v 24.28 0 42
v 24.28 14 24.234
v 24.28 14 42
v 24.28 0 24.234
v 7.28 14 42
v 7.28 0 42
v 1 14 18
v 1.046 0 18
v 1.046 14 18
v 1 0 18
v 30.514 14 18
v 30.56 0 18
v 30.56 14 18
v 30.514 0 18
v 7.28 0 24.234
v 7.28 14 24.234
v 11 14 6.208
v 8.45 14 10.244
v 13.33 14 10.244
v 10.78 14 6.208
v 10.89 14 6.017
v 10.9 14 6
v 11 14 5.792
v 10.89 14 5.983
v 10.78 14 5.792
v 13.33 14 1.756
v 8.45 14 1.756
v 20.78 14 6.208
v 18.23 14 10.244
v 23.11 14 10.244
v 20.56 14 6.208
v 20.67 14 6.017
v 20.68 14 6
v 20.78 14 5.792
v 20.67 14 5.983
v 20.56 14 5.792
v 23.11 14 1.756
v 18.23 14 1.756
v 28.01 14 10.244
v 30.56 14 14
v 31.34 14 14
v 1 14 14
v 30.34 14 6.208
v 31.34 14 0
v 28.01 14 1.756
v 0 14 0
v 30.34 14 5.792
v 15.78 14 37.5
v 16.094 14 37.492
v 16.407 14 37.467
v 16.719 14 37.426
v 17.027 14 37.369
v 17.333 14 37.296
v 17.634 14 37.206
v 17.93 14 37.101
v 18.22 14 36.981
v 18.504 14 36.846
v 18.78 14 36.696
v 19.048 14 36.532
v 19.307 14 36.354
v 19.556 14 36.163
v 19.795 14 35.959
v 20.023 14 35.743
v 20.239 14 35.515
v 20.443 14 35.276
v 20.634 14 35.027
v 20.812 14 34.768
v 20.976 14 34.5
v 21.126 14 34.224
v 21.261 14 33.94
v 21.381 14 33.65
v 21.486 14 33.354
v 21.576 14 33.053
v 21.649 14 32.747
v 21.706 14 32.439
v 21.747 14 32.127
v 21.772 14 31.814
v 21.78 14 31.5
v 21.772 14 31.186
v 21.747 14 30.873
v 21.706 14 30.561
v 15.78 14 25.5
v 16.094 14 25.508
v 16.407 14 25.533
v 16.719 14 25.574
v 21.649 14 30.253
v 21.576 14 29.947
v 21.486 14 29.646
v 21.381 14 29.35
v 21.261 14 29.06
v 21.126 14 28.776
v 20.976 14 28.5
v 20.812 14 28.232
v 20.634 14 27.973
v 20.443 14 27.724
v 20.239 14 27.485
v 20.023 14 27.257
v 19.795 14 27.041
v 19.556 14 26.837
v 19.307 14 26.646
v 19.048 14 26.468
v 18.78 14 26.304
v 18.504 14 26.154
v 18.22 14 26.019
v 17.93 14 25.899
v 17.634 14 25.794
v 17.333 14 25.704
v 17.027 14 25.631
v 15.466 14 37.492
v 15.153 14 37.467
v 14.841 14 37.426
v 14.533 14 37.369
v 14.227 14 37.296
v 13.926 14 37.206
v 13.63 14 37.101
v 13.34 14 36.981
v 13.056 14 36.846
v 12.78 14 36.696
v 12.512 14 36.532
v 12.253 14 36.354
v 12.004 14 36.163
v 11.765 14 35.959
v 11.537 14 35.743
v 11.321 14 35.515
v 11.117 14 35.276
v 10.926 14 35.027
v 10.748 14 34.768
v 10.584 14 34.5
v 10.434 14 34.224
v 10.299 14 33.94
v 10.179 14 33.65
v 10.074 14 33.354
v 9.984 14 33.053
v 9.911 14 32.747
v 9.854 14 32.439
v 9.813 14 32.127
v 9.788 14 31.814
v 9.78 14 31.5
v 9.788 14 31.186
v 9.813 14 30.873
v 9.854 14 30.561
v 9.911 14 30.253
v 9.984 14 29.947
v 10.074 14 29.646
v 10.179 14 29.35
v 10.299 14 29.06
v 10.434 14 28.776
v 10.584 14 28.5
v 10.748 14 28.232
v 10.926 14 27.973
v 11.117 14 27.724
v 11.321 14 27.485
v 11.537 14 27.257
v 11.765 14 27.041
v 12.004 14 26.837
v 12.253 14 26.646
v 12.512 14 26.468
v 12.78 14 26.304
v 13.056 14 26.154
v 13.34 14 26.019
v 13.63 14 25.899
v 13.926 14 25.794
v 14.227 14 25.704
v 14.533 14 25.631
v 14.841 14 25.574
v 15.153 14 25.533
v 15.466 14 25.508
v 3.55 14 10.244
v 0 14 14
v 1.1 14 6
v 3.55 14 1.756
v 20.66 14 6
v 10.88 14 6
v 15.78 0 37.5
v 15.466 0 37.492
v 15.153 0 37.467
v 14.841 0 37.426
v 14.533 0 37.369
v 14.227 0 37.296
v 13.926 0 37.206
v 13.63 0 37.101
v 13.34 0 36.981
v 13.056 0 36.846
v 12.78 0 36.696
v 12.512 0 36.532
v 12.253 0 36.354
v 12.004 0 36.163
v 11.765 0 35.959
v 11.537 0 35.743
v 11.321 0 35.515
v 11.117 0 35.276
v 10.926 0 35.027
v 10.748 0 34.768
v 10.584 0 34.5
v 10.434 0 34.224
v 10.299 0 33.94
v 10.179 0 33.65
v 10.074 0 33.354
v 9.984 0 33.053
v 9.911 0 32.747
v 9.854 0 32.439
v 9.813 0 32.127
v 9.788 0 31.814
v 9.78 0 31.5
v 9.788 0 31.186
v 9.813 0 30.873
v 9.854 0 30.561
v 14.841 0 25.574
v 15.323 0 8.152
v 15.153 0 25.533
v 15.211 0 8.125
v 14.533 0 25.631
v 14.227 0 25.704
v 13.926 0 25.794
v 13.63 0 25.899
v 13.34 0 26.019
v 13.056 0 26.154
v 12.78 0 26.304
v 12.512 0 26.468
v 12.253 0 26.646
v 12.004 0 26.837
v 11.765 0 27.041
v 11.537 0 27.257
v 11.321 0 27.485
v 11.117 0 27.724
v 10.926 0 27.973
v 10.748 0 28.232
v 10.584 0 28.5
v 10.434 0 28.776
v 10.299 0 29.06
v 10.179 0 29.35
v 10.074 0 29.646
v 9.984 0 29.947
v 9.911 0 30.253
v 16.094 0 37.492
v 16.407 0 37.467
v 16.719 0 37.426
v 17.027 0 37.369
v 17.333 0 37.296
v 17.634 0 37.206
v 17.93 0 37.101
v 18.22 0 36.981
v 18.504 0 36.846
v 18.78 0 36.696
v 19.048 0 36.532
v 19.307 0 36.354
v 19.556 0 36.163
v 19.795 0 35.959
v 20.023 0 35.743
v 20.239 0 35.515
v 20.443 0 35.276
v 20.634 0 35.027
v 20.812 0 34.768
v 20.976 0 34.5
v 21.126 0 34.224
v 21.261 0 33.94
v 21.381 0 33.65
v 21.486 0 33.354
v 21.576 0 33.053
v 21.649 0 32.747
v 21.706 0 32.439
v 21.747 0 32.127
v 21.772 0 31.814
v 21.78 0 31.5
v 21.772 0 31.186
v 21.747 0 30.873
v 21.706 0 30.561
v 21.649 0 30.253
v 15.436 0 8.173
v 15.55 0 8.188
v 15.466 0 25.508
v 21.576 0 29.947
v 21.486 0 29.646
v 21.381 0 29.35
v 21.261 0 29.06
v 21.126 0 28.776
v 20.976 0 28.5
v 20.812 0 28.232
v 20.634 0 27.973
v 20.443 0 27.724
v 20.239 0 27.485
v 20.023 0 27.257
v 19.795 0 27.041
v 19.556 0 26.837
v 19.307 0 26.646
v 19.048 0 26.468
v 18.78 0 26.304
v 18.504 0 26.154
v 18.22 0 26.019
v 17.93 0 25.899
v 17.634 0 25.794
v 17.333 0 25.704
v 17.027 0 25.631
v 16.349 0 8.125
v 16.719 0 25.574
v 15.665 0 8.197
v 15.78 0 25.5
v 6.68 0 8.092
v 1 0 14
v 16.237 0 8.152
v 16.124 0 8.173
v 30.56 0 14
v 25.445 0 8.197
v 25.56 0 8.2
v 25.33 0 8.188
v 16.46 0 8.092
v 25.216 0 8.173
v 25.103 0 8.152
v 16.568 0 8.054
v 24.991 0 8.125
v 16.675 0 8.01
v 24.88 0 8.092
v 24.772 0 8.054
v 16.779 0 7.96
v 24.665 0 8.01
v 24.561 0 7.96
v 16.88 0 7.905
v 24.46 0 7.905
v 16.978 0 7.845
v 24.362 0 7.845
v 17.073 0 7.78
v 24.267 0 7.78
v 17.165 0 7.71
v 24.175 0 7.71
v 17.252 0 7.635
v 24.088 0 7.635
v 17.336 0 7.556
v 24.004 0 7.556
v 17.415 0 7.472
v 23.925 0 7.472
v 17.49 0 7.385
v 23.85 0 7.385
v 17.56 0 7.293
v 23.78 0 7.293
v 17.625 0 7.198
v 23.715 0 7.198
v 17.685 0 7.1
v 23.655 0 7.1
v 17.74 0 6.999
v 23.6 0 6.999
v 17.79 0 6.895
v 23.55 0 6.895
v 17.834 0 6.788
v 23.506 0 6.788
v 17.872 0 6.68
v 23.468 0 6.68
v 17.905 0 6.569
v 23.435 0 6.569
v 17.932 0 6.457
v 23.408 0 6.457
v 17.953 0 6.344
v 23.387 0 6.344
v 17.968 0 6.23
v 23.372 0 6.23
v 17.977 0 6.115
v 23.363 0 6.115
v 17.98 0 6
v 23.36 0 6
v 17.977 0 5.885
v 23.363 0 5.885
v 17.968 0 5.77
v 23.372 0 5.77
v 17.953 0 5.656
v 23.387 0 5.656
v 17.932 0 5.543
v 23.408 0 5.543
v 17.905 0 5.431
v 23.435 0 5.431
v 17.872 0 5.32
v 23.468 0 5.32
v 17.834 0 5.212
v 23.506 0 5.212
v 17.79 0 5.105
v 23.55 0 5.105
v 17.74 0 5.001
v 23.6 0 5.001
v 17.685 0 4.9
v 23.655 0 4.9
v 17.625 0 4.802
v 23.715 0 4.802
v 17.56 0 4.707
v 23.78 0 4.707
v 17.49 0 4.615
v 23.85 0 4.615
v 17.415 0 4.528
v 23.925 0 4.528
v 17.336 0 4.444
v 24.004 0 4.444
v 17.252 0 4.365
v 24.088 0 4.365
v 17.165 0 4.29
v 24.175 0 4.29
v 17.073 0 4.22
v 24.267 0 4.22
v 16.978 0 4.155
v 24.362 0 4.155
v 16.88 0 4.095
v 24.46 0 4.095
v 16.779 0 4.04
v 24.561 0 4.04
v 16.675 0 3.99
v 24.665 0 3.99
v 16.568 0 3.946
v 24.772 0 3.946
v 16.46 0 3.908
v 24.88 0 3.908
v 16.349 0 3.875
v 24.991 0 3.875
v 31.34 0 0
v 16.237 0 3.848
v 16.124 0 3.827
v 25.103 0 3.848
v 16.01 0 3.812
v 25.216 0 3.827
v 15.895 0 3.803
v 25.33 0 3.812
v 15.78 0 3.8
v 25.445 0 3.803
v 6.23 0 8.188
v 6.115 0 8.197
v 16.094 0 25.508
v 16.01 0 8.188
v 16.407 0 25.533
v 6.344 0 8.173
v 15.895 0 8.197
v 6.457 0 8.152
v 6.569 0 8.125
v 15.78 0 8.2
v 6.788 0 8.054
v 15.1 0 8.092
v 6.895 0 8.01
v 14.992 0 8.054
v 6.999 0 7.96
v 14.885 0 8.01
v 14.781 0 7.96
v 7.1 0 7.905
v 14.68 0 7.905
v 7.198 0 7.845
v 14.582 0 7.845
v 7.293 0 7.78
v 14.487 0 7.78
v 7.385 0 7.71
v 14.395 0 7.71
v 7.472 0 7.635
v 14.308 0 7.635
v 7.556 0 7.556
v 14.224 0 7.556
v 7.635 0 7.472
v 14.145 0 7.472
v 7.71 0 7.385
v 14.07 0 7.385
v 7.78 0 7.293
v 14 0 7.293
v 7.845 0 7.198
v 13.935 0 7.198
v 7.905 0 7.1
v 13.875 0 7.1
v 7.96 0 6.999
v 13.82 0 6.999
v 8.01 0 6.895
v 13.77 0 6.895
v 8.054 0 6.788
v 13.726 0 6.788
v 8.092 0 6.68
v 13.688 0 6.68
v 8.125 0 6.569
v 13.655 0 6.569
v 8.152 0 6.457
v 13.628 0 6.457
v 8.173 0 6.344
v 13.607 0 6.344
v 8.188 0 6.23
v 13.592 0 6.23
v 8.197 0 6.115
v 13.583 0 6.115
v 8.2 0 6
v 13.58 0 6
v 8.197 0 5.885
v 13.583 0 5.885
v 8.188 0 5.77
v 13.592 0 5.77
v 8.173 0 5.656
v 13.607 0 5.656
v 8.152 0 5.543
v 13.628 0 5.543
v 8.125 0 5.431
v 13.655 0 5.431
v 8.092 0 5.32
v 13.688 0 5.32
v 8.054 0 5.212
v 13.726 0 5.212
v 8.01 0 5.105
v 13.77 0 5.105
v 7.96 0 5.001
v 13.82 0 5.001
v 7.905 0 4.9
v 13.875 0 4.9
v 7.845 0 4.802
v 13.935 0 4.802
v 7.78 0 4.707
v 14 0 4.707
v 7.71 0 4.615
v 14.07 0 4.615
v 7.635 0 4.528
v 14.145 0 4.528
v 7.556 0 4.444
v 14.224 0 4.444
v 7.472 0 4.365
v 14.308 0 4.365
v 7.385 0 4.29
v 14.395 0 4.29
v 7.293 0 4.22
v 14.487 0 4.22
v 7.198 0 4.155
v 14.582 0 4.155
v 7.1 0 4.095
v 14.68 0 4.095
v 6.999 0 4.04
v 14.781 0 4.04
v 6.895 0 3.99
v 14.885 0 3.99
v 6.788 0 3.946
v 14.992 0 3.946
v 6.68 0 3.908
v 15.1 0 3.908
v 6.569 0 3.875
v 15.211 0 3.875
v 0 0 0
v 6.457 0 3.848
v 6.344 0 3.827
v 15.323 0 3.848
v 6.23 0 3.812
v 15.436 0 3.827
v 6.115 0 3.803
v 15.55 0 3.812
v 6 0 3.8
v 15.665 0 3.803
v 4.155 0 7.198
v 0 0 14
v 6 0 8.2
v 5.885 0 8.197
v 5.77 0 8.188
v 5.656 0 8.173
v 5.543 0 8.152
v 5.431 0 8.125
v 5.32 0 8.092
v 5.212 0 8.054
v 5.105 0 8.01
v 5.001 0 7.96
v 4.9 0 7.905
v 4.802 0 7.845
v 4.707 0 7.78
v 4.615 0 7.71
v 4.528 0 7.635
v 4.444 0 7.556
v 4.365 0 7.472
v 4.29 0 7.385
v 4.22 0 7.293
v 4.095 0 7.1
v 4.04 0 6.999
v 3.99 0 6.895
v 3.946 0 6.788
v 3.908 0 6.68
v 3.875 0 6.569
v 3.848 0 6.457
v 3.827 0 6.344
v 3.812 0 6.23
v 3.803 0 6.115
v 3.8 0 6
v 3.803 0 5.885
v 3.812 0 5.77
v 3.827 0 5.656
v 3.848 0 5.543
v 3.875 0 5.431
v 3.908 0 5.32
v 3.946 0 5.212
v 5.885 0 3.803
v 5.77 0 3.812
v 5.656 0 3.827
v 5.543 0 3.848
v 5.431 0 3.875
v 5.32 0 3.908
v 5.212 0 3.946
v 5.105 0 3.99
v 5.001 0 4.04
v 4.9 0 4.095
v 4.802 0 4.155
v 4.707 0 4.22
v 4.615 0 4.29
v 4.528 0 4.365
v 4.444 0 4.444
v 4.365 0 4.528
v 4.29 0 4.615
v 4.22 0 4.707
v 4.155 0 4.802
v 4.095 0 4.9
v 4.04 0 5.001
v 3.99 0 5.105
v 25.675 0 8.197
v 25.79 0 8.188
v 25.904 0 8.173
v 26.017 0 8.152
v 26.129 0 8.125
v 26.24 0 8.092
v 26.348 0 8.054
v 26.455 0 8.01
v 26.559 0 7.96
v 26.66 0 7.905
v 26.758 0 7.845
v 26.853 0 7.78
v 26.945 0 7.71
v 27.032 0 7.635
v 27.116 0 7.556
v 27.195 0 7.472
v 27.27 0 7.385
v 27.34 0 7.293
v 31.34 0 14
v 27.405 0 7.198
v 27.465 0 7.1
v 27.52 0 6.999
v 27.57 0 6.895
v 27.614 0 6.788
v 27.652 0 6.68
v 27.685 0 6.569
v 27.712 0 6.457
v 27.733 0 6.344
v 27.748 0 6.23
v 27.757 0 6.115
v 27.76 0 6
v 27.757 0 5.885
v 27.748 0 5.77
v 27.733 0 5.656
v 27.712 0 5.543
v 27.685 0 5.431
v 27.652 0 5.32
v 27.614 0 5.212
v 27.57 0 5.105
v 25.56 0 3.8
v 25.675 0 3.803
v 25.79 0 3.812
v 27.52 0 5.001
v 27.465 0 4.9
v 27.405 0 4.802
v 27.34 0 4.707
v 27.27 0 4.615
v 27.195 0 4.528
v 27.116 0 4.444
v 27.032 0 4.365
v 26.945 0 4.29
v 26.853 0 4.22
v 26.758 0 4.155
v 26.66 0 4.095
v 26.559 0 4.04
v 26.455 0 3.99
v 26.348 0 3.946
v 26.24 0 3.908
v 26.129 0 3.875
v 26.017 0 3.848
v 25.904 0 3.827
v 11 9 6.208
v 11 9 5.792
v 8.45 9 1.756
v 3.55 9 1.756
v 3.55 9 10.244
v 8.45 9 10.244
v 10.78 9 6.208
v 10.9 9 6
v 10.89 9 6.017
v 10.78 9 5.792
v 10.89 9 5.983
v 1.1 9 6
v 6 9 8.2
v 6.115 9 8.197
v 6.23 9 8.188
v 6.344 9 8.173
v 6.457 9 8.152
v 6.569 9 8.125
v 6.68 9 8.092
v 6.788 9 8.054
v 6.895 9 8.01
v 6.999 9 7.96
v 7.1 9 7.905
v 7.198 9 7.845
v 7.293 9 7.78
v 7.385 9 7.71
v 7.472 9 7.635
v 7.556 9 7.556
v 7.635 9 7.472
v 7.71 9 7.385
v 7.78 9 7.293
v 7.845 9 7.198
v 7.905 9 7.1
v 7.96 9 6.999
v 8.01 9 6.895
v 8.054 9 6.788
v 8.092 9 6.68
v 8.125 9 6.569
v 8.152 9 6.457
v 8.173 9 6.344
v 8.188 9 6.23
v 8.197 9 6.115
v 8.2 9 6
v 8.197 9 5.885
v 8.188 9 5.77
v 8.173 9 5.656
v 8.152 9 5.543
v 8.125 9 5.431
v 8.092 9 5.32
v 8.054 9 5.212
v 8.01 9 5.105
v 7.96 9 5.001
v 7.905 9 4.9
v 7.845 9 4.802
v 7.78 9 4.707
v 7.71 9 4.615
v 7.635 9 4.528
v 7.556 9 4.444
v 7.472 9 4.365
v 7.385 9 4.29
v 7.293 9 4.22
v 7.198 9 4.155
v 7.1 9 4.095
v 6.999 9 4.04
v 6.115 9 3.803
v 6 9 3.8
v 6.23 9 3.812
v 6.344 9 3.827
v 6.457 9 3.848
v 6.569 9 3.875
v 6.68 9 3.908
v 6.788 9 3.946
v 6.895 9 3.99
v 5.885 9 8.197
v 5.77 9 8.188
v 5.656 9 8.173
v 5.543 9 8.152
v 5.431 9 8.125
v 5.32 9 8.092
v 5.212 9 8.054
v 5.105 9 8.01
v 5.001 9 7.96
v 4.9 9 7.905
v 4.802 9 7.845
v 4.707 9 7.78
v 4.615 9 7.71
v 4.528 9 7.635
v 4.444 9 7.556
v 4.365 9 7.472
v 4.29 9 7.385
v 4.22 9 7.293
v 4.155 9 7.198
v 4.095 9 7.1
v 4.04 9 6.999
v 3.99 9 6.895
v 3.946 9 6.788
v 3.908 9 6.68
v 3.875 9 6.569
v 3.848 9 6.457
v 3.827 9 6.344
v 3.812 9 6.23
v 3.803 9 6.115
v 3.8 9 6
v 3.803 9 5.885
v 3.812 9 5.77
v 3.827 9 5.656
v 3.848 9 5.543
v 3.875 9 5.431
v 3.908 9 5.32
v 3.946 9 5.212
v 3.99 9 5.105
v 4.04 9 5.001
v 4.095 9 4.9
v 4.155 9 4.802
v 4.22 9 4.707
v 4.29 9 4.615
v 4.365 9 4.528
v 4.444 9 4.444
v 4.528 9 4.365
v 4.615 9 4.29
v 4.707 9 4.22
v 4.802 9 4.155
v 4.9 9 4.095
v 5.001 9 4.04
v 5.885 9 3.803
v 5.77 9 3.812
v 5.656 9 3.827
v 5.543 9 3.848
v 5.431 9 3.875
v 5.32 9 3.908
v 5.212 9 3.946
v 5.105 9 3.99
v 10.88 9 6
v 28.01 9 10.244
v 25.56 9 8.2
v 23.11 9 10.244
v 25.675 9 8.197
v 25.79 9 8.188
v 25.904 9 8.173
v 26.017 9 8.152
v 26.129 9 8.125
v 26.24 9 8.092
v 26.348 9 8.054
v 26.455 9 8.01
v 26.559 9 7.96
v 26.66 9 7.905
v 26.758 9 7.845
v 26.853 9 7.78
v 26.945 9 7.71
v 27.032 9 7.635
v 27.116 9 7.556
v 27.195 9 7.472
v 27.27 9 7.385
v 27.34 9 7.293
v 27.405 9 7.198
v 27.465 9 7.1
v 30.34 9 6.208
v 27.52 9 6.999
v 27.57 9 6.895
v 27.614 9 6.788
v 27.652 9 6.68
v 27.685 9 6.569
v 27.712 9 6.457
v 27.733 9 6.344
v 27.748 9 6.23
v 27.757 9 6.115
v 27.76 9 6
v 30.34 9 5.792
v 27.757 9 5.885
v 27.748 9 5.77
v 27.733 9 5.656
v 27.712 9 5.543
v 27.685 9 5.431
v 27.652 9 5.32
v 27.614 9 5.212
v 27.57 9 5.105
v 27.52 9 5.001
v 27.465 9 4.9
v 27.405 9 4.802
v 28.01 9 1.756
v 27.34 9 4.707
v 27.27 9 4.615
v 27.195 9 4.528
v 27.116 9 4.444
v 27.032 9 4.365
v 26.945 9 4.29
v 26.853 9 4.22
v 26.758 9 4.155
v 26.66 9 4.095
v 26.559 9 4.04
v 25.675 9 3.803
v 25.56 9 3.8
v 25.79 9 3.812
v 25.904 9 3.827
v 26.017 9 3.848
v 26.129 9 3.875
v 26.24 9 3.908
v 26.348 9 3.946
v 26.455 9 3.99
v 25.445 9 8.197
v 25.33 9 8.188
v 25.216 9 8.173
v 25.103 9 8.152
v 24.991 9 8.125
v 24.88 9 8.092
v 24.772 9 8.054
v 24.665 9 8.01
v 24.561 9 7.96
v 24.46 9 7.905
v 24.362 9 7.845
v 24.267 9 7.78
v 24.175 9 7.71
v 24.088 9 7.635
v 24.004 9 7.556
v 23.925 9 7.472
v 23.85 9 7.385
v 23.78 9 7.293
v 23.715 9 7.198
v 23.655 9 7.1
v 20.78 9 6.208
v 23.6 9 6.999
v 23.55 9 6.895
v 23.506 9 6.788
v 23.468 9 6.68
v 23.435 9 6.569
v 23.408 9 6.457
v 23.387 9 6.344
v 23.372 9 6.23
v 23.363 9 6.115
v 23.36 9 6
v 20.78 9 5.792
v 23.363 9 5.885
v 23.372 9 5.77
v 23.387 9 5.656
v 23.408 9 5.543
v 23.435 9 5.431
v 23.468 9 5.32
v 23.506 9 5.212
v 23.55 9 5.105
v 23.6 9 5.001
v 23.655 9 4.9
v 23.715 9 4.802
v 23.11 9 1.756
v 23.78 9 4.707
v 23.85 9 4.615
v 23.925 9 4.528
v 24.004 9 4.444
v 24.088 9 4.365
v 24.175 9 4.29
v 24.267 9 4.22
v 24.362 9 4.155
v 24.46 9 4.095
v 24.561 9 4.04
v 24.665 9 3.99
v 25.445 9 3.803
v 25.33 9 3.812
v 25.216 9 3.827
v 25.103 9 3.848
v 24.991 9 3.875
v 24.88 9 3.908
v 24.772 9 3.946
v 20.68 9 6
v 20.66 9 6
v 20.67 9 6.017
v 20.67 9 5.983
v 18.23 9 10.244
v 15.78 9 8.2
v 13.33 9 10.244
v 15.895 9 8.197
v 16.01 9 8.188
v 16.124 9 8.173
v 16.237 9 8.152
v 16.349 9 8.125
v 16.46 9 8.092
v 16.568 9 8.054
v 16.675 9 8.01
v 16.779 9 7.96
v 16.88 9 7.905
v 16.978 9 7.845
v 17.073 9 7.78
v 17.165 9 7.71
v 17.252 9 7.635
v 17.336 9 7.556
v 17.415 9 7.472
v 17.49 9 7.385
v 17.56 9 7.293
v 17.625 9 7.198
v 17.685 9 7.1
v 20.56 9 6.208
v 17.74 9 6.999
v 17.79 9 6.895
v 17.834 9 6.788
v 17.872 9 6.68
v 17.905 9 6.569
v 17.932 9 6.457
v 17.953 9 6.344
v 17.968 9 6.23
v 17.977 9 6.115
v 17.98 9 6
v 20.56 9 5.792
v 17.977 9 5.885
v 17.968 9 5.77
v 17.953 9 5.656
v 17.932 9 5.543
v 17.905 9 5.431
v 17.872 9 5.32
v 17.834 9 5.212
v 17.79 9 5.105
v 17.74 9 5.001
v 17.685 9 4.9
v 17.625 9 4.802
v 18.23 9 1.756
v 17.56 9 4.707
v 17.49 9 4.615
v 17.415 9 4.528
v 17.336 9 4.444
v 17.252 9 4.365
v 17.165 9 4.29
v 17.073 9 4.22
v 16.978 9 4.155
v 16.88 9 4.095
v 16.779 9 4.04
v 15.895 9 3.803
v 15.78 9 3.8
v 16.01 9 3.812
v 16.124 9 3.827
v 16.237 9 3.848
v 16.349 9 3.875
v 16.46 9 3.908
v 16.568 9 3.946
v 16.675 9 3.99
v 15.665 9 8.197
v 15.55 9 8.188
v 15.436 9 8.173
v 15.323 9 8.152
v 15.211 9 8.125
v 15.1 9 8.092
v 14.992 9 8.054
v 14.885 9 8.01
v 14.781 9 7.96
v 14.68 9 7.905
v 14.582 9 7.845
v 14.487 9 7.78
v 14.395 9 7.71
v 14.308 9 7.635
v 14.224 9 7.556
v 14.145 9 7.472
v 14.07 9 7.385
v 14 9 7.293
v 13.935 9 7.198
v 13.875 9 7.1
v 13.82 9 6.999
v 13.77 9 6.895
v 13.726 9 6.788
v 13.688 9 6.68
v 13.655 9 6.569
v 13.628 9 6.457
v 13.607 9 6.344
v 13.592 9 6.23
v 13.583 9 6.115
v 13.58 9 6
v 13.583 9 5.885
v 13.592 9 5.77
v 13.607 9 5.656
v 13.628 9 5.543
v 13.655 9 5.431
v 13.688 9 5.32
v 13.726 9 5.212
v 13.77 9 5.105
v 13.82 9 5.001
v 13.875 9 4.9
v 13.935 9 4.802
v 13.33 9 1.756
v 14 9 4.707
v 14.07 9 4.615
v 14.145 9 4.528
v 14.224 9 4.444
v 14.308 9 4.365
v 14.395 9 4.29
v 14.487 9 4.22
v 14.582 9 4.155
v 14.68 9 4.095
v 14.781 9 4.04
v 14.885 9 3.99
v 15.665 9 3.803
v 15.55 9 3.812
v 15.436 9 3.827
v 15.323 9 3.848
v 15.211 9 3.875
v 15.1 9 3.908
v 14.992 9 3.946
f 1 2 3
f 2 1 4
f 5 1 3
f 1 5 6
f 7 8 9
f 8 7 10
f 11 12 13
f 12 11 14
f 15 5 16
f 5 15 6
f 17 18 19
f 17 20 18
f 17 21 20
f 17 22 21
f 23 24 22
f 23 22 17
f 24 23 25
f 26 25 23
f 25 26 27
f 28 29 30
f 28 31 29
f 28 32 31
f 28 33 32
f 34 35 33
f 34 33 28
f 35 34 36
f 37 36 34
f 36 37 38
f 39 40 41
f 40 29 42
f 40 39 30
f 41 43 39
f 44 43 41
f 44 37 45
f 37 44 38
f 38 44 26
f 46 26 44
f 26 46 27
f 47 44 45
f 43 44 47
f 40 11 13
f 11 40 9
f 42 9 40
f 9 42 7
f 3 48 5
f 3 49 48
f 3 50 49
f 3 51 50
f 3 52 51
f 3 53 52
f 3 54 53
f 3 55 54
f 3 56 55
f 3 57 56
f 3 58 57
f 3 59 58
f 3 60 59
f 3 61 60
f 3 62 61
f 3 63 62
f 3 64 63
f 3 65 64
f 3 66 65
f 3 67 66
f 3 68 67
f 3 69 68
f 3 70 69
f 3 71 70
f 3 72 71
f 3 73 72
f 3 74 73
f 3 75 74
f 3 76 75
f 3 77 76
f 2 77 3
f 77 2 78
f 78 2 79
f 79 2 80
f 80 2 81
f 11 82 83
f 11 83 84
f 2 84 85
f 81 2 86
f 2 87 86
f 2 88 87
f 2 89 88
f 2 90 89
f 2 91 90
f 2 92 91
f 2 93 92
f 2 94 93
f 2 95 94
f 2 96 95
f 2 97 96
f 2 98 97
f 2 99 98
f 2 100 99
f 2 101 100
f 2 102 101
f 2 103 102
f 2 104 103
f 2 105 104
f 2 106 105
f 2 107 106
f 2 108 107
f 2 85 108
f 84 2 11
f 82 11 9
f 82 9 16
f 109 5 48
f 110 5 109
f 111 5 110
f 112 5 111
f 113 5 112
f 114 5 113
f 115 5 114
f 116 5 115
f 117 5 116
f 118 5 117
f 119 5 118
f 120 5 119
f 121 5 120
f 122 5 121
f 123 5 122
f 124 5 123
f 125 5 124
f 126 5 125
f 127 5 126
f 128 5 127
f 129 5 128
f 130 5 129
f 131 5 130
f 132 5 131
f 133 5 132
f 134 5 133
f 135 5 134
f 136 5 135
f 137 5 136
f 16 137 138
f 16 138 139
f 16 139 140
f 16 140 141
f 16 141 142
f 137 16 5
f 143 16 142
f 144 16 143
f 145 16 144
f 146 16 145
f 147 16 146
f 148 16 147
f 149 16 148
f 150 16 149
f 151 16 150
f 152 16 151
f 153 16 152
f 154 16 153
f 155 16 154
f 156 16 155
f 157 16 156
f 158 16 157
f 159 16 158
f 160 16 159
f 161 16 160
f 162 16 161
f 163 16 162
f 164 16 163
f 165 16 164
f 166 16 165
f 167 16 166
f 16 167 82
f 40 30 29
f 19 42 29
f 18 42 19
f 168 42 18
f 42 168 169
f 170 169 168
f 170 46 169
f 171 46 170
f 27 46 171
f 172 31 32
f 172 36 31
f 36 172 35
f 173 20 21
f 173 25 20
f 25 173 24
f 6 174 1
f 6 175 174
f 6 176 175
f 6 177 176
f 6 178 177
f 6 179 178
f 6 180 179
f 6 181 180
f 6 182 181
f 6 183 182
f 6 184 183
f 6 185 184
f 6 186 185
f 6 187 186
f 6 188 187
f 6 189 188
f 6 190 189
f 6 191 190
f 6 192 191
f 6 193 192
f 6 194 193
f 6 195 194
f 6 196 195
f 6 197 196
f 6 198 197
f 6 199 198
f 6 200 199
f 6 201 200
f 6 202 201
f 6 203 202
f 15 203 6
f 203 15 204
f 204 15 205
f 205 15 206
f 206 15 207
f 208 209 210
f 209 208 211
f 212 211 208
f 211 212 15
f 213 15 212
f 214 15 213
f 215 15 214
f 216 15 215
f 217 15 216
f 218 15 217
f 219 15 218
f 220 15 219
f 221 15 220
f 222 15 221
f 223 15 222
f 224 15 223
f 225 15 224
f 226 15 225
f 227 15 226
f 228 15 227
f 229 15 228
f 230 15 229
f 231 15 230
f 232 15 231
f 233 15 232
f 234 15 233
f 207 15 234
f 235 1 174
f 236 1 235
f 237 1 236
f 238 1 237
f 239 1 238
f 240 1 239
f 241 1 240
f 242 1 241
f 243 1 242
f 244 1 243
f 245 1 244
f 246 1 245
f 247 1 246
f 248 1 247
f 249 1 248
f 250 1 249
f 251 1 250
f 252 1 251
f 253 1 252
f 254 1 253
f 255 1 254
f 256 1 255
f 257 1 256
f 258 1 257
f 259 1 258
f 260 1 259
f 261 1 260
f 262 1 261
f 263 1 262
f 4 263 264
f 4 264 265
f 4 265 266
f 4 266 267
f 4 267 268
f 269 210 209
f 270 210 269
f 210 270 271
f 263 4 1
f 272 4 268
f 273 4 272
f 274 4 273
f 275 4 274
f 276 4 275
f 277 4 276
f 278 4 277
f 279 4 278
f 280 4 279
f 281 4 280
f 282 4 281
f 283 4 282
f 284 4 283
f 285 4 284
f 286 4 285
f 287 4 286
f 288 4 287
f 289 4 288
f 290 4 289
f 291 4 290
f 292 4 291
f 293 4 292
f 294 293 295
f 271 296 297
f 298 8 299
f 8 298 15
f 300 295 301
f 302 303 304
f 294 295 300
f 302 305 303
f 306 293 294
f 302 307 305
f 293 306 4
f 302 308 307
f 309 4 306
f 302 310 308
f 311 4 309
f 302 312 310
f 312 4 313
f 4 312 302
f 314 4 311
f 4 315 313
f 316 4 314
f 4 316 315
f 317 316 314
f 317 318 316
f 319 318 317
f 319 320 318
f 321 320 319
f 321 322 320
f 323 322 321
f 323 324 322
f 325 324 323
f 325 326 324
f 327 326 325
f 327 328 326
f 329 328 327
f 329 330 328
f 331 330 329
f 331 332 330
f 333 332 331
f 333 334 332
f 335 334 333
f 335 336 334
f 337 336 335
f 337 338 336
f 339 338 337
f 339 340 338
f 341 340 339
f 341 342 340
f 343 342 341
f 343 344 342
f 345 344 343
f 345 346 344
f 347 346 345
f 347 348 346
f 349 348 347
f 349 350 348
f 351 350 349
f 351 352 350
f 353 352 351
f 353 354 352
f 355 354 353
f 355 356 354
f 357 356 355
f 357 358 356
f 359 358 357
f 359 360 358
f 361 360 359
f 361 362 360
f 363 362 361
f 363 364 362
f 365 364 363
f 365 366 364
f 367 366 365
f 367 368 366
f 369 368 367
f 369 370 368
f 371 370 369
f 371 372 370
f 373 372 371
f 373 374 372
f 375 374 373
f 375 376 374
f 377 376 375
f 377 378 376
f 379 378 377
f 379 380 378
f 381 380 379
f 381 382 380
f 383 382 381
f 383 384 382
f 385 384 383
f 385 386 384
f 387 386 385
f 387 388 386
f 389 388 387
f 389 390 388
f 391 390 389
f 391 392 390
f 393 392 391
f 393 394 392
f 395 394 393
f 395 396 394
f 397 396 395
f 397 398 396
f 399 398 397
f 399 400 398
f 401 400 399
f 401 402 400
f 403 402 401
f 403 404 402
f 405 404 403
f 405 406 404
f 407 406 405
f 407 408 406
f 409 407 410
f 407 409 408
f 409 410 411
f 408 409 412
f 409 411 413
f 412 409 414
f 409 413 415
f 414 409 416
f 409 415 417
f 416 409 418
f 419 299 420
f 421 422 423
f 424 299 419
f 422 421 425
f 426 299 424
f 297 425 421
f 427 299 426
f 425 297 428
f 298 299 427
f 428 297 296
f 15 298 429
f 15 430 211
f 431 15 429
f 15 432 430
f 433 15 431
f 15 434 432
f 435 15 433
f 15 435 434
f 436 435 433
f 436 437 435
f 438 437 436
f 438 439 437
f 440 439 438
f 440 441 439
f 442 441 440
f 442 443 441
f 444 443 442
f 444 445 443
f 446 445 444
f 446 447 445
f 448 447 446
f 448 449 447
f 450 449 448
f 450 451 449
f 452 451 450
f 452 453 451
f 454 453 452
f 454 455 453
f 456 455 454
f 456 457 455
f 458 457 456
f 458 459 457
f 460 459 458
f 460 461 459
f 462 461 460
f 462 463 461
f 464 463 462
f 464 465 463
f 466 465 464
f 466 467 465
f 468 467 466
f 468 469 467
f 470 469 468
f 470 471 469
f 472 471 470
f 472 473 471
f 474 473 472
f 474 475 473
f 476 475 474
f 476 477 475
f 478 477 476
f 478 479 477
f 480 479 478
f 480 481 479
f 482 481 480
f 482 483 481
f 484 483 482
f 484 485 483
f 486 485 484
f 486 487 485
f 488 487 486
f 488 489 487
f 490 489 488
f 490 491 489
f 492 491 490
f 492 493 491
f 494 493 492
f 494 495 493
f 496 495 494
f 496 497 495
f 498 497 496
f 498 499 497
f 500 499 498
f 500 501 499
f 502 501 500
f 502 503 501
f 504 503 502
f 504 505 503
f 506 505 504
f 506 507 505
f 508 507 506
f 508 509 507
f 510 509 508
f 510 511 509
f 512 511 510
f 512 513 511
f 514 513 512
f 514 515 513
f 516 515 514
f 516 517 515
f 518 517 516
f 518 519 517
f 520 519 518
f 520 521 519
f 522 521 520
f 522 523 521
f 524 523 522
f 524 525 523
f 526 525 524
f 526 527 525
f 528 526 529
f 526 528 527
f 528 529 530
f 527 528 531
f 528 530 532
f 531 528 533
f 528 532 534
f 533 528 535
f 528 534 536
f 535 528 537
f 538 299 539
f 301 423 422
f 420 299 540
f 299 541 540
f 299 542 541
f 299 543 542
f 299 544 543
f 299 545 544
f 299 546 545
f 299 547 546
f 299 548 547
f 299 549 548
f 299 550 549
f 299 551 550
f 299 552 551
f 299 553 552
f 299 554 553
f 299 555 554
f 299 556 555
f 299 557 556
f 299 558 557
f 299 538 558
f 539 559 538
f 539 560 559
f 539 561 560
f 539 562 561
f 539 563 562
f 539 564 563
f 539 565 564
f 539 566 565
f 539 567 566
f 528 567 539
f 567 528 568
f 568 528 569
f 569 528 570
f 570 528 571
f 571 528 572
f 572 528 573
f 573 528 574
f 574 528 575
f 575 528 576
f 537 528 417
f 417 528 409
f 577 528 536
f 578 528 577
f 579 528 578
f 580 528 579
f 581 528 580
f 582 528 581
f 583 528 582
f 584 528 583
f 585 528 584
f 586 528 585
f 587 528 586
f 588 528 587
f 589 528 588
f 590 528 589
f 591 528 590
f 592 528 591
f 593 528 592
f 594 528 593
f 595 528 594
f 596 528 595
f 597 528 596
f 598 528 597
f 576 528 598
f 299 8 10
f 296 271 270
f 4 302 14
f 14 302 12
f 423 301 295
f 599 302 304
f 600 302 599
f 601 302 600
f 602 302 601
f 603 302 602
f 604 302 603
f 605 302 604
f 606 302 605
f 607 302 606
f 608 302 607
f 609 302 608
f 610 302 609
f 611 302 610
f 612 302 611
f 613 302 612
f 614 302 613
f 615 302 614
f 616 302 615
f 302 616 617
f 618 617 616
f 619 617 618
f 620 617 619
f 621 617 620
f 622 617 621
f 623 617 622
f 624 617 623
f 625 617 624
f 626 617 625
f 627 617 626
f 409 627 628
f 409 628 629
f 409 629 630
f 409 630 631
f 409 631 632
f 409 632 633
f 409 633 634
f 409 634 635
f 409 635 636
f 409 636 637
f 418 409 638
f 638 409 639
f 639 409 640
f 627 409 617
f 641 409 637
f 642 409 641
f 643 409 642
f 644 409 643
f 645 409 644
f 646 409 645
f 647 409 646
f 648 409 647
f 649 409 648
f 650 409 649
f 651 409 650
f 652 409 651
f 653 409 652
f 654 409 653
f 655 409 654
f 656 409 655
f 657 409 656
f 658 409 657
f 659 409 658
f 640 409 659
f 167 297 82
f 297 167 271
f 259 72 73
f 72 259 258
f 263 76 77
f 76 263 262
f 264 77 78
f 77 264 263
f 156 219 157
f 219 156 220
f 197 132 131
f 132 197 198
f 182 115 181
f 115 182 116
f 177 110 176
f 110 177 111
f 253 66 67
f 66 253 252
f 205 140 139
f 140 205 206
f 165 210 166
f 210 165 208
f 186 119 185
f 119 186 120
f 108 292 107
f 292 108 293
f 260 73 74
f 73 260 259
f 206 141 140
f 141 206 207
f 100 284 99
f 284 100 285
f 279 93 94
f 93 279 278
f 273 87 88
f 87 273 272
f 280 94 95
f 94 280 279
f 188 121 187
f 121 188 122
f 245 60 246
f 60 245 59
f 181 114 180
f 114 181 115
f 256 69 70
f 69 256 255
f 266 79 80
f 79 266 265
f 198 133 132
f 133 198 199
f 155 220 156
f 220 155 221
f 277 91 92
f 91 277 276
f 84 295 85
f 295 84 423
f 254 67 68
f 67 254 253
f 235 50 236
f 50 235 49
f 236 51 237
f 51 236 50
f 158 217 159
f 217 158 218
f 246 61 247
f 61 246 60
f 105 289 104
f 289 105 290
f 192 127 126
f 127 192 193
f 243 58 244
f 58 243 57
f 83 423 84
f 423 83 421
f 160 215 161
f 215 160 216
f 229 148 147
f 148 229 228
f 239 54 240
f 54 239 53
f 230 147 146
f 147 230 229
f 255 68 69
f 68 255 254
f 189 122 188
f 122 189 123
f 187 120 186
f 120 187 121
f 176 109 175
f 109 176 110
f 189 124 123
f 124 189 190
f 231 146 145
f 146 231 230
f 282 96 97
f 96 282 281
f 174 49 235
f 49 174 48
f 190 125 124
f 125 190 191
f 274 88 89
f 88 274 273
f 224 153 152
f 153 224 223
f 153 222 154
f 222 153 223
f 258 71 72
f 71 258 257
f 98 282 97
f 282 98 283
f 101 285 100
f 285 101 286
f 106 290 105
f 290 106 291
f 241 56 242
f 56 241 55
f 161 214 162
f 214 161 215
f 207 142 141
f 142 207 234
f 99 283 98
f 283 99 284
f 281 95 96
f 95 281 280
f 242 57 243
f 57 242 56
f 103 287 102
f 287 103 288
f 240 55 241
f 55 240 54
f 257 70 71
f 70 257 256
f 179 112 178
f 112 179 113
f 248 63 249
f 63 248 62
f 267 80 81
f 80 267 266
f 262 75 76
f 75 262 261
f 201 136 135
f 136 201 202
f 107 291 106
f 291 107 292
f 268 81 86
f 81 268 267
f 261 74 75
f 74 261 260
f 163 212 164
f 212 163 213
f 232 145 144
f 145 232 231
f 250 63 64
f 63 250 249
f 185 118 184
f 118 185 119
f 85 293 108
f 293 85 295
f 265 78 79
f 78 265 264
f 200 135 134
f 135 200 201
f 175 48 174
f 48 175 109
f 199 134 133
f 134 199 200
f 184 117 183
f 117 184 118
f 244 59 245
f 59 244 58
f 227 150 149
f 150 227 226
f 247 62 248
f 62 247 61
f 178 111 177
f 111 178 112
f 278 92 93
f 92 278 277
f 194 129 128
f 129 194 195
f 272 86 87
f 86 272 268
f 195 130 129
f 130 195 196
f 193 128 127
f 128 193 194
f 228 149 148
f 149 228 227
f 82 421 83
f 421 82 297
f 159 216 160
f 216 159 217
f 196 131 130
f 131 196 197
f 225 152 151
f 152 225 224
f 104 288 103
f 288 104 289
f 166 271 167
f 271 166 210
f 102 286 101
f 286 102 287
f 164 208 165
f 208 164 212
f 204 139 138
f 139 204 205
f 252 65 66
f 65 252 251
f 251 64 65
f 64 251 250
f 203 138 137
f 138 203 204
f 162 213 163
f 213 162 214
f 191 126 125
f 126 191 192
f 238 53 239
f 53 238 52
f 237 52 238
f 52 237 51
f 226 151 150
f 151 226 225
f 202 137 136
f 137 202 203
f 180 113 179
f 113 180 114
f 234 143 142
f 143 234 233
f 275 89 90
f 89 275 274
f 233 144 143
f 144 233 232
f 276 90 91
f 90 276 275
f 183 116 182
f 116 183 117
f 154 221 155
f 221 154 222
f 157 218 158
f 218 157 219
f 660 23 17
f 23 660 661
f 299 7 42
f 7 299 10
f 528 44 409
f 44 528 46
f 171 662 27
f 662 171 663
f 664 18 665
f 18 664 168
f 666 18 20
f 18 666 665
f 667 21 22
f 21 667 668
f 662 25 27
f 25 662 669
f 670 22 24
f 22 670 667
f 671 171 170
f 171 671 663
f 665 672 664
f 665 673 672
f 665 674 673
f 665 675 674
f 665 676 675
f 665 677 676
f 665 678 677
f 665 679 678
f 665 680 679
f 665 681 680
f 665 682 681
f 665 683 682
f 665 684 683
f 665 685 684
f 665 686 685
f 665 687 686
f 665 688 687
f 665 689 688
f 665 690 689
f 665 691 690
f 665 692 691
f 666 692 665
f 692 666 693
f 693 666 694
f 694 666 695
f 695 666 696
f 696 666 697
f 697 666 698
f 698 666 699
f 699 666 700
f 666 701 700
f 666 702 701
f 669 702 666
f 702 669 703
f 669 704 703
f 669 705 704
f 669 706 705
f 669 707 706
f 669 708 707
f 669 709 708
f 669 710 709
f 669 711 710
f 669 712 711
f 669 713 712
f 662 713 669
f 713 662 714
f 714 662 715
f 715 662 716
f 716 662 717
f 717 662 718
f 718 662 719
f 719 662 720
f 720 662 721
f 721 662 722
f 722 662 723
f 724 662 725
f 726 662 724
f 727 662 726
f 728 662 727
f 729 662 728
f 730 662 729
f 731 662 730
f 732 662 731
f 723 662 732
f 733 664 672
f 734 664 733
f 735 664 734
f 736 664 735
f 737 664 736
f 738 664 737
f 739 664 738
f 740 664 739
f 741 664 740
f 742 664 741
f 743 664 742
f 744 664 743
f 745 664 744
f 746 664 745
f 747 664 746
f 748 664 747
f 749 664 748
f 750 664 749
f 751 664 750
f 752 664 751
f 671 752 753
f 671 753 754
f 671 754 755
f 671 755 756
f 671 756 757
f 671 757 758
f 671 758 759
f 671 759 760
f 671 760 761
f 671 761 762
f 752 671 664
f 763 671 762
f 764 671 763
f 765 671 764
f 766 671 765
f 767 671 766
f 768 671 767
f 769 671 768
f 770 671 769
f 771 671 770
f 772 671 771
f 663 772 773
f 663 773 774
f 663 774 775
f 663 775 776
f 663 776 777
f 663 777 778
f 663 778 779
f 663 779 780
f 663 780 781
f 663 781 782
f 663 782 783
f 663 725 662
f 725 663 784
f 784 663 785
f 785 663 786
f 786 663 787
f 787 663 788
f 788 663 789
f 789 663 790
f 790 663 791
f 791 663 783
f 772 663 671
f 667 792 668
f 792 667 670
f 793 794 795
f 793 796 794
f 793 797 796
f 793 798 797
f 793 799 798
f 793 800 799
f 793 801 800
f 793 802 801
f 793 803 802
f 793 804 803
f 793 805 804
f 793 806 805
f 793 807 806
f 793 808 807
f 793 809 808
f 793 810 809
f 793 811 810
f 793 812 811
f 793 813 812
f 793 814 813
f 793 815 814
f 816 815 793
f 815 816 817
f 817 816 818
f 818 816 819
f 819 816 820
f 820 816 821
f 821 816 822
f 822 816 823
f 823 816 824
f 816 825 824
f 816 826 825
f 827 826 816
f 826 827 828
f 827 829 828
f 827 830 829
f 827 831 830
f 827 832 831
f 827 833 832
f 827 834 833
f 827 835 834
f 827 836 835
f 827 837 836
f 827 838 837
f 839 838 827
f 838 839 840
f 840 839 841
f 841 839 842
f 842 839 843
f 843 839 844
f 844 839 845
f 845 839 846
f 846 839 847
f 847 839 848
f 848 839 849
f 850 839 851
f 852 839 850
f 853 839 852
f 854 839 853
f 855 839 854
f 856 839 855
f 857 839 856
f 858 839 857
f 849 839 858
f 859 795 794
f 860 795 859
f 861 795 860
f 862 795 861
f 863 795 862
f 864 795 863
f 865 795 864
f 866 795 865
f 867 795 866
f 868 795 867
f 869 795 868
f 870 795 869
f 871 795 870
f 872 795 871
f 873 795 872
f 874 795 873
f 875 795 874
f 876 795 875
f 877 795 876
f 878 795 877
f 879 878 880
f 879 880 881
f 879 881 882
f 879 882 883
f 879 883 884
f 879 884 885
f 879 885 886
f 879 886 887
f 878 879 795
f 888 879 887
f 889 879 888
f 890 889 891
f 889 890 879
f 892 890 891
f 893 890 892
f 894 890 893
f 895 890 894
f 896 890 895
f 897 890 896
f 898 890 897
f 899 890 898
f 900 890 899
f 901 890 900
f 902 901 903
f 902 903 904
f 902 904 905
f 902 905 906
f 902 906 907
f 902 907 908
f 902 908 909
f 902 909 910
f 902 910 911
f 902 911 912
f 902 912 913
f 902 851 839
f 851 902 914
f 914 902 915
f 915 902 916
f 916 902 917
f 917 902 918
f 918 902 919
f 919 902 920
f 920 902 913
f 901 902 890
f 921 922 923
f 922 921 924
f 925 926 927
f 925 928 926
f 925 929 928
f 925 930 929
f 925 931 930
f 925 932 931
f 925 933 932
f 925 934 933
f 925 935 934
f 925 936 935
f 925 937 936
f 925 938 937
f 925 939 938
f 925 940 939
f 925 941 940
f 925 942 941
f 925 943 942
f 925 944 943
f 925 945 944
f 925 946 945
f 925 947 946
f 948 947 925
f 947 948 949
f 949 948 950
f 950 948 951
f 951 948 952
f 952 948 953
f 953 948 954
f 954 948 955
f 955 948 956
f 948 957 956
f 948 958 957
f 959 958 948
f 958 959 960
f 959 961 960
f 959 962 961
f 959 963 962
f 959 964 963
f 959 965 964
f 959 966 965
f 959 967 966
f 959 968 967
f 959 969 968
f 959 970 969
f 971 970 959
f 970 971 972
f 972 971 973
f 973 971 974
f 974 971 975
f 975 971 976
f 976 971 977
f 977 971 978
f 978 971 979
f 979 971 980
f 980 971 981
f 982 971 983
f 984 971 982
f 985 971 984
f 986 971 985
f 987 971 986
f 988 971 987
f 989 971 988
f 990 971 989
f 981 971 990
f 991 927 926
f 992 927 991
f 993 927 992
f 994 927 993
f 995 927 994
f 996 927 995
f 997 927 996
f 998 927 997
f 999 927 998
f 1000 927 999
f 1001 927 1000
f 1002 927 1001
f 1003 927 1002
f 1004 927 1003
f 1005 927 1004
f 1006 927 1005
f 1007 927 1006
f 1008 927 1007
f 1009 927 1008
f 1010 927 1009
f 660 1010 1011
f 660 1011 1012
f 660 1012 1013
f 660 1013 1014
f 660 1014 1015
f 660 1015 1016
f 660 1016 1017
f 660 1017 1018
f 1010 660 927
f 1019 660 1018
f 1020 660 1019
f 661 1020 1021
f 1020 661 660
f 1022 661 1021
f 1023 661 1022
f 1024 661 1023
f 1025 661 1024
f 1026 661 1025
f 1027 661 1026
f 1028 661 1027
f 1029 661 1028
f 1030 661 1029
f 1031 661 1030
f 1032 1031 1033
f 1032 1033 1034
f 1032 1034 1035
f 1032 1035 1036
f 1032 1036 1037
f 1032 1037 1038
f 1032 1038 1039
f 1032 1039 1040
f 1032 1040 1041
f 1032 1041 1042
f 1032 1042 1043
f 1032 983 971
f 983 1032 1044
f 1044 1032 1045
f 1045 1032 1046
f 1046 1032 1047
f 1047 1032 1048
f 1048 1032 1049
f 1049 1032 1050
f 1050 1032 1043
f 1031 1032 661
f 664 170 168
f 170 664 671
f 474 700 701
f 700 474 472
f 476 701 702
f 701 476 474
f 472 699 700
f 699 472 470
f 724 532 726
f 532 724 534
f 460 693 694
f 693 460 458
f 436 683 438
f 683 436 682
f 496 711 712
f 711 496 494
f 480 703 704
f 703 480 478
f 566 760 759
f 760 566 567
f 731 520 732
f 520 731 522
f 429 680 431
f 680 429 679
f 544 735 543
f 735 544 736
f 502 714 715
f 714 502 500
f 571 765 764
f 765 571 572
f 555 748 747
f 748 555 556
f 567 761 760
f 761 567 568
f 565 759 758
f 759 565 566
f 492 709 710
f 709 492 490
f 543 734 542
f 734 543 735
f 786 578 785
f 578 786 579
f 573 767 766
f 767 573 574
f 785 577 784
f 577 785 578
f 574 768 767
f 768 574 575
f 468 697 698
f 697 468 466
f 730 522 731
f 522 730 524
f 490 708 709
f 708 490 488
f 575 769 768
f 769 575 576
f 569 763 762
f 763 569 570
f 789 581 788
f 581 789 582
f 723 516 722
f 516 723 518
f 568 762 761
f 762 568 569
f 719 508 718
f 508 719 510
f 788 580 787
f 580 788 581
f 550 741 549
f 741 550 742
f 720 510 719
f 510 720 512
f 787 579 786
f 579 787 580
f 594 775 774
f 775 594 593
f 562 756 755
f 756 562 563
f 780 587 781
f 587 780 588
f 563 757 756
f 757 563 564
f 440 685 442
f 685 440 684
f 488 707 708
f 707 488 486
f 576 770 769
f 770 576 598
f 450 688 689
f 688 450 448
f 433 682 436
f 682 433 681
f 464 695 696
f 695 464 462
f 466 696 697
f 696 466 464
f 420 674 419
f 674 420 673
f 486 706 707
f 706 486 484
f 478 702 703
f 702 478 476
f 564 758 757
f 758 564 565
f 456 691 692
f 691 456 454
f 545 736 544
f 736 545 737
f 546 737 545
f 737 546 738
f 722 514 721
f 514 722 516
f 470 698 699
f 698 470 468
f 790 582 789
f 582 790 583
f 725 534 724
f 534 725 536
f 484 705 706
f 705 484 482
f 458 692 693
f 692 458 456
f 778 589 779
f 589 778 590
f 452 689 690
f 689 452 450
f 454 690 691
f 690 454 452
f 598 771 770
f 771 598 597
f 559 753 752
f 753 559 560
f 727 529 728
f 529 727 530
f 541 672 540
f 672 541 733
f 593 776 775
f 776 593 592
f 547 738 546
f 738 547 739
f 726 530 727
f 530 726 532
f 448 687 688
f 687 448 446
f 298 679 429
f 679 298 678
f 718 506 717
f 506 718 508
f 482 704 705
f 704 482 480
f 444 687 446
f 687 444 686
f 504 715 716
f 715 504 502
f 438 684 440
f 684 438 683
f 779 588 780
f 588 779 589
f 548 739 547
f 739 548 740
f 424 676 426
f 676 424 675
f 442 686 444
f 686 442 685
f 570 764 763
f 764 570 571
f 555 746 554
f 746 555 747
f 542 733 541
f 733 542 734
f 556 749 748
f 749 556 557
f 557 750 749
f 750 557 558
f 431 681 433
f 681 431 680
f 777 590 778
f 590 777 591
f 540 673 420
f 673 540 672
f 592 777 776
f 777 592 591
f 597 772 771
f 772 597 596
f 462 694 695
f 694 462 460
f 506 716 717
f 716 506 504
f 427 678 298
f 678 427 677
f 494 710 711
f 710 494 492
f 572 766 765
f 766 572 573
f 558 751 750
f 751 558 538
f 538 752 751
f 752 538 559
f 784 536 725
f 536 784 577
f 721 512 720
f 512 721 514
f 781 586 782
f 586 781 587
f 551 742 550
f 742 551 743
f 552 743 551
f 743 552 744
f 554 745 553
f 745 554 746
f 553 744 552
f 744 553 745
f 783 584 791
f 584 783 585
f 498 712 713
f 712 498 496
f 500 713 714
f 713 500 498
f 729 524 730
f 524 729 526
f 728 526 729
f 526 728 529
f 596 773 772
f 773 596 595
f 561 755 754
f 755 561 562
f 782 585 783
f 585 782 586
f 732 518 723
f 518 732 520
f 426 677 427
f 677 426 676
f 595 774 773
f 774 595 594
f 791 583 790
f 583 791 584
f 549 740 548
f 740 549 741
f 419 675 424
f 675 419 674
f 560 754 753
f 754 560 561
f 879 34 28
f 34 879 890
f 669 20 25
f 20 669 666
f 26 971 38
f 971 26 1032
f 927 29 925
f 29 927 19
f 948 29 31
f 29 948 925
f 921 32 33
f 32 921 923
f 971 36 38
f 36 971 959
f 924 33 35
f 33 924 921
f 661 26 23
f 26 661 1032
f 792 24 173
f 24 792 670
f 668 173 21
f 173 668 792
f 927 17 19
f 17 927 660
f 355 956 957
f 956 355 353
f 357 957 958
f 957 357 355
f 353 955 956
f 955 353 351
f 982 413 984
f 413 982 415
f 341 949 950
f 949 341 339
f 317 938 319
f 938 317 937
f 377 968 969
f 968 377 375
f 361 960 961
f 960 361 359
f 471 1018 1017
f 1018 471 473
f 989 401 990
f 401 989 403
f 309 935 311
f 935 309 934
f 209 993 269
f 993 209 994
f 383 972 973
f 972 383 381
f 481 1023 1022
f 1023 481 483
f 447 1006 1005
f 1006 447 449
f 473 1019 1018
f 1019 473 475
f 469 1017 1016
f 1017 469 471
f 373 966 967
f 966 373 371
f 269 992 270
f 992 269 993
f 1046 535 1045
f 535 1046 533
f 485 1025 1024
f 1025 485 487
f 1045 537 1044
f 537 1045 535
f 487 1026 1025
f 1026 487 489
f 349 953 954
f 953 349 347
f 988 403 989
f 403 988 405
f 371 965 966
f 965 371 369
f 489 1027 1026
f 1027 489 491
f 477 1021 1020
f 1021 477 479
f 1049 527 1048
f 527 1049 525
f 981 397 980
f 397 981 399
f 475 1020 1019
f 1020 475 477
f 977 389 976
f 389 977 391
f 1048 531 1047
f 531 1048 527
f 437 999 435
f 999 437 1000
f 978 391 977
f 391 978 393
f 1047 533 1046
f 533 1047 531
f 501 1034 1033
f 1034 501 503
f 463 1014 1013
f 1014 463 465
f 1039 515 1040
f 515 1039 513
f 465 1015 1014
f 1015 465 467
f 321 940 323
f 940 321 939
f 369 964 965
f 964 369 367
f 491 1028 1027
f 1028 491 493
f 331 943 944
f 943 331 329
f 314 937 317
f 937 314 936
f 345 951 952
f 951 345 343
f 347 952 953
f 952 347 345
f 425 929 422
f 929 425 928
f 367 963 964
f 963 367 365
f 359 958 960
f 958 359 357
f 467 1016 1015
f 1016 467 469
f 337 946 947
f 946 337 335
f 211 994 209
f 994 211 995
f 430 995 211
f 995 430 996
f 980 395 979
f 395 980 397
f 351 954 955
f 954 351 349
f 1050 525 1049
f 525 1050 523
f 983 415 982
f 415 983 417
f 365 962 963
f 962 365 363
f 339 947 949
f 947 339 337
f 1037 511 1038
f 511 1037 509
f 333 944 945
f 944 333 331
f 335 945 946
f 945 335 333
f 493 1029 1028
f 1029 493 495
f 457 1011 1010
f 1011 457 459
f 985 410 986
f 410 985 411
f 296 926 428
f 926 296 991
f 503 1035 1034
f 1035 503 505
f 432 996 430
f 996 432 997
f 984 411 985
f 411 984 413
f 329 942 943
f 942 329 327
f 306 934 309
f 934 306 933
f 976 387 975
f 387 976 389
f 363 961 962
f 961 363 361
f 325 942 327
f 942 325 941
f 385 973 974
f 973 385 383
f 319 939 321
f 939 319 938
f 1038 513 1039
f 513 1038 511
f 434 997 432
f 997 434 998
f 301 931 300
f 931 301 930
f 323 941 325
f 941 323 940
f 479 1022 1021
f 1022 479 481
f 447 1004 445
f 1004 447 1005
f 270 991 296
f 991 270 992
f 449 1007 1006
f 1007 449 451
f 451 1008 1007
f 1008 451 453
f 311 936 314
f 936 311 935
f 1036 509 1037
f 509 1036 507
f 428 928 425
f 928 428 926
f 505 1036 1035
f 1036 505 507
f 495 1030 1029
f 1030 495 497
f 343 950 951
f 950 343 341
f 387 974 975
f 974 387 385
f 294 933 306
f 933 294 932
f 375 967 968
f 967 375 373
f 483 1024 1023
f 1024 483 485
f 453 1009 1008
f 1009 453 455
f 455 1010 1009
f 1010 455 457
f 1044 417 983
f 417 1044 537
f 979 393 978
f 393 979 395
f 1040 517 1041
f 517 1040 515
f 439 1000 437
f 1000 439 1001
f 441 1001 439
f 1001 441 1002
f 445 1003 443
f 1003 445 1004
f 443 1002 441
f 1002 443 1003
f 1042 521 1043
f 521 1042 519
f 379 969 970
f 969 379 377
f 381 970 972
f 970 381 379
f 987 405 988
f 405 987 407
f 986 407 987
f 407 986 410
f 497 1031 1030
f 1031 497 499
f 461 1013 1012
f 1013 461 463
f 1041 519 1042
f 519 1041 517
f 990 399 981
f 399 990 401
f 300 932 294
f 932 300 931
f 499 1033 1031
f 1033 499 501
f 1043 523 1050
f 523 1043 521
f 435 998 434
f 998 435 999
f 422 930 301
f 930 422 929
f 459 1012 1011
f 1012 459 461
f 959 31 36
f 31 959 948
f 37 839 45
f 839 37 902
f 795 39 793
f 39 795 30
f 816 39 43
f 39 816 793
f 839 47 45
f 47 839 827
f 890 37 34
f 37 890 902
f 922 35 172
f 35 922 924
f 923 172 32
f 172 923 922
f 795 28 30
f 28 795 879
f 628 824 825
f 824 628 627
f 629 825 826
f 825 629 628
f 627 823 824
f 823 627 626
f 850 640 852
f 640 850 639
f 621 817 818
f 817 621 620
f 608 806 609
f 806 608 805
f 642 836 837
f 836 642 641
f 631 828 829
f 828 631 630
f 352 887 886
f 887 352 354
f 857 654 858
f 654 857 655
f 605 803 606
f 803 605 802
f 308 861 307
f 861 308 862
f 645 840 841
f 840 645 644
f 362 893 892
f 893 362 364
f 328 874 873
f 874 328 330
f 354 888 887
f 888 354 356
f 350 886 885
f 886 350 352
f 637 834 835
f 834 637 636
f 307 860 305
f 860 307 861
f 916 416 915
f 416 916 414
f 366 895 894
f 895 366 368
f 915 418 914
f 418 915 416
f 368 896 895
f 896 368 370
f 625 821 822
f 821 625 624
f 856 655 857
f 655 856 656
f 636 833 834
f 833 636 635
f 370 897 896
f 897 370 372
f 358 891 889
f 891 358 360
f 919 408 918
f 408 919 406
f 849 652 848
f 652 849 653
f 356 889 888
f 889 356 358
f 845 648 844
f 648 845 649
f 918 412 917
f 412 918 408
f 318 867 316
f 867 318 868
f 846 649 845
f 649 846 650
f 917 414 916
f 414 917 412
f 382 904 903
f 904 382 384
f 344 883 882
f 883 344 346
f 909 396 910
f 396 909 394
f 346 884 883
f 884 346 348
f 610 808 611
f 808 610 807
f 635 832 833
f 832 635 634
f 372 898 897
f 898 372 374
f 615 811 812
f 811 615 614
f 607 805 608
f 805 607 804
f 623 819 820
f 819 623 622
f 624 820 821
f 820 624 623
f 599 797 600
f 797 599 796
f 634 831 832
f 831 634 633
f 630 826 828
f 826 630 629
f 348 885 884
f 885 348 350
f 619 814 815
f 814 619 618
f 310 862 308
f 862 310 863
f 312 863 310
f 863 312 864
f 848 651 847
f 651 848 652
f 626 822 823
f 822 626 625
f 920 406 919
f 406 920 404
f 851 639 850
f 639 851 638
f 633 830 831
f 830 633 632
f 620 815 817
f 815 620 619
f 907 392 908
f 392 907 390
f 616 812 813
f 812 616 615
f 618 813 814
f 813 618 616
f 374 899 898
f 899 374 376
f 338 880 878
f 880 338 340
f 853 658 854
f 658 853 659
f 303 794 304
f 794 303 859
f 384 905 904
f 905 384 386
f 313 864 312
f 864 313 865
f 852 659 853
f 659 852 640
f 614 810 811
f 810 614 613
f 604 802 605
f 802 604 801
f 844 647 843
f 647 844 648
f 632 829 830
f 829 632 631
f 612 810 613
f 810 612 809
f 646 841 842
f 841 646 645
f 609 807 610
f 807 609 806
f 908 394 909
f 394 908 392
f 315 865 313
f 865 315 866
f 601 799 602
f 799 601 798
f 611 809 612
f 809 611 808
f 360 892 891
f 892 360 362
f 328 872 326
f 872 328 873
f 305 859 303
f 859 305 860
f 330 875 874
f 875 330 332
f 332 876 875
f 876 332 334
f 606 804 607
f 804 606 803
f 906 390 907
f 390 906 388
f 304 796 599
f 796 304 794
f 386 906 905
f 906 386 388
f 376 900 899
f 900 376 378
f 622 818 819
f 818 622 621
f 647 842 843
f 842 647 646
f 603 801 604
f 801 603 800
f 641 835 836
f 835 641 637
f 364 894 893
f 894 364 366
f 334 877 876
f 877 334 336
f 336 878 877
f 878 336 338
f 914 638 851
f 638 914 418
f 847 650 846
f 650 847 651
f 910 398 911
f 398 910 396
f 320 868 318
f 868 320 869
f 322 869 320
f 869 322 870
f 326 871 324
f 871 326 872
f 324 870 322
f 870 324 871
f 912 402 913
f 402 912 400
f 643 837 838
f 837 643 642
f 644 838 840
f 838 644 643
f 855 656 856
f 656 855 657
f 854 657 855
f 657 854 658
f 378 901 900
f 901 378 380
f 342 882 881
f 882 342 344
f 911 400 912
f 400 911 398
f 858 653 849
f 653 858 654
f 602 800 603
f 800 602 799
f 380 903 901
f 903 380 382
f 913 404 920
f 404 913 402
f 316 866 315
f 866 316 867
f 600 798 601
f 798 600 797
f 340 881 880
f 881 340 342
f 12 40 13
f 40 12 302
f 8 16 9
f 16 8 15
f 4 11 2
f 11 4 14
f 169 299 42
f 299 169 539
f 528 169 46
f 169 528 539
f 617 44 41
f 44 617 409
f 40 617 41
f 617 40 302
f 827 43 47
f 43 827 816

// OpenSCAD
// Real Lonely T-Rex Game: Bearing Holder
// Copyright (C) 2017, Uri Shaked and Ariella Eliassaf

$fn=120;
base_height=5;
nyloc_nut_hole_r = 7.8/2+1;
nyloc_nut_depth = 5;
hole_spacing = 9.78;

module nyloc_mount(depth=10) {
    translate([0,depth,0])
    rotate([90,0,0])
    difference() {
        cube([10,13,depth]);
        
        translate([5,6,0])
        cylinder(r=nyloc_nut_hole_r,h=nyloc_nut_depth,$fn=6);

        translate([5,6,5])
        cylinder(r=2.2,h=depth-nyloc_nut_depth);
    }
}

translate([1,0,13])
  cube([hole_spacing*2+10, 14, base_height]);

translate([1+5.7,0,12.34])
rotate([0, -45, 0])
  cube([9, 14, 8]);

translate([1+hole_spacing*2+10, 0, 0])
mirror([1, 0, 0])
translate([5.7,0,12.34])
rotate([0, -45, 0])
  cube([9, 14, 8]);


translate([1+(hole_spacing*2+10-17)/2,0,13])
difference(){
    translate([0, 0, base_height])
    cube([17,14,24]);
    
    translate([8.5, 15, 18.5])
    rotate([90, 0, 0])
    cylinder(h = 32, r = 6);
};

cube([1,14,14]);

translate([1,0,0])
    nyloc_mount(14);

translate([1+hole_spacing,0,0])
    nyloc_mount(14);

translate([1+hole_spacing*2,0,0])
    nyloc_mount(14);

translate([1+hole_spacing*3,0,0])
cube([1,14,14]);
